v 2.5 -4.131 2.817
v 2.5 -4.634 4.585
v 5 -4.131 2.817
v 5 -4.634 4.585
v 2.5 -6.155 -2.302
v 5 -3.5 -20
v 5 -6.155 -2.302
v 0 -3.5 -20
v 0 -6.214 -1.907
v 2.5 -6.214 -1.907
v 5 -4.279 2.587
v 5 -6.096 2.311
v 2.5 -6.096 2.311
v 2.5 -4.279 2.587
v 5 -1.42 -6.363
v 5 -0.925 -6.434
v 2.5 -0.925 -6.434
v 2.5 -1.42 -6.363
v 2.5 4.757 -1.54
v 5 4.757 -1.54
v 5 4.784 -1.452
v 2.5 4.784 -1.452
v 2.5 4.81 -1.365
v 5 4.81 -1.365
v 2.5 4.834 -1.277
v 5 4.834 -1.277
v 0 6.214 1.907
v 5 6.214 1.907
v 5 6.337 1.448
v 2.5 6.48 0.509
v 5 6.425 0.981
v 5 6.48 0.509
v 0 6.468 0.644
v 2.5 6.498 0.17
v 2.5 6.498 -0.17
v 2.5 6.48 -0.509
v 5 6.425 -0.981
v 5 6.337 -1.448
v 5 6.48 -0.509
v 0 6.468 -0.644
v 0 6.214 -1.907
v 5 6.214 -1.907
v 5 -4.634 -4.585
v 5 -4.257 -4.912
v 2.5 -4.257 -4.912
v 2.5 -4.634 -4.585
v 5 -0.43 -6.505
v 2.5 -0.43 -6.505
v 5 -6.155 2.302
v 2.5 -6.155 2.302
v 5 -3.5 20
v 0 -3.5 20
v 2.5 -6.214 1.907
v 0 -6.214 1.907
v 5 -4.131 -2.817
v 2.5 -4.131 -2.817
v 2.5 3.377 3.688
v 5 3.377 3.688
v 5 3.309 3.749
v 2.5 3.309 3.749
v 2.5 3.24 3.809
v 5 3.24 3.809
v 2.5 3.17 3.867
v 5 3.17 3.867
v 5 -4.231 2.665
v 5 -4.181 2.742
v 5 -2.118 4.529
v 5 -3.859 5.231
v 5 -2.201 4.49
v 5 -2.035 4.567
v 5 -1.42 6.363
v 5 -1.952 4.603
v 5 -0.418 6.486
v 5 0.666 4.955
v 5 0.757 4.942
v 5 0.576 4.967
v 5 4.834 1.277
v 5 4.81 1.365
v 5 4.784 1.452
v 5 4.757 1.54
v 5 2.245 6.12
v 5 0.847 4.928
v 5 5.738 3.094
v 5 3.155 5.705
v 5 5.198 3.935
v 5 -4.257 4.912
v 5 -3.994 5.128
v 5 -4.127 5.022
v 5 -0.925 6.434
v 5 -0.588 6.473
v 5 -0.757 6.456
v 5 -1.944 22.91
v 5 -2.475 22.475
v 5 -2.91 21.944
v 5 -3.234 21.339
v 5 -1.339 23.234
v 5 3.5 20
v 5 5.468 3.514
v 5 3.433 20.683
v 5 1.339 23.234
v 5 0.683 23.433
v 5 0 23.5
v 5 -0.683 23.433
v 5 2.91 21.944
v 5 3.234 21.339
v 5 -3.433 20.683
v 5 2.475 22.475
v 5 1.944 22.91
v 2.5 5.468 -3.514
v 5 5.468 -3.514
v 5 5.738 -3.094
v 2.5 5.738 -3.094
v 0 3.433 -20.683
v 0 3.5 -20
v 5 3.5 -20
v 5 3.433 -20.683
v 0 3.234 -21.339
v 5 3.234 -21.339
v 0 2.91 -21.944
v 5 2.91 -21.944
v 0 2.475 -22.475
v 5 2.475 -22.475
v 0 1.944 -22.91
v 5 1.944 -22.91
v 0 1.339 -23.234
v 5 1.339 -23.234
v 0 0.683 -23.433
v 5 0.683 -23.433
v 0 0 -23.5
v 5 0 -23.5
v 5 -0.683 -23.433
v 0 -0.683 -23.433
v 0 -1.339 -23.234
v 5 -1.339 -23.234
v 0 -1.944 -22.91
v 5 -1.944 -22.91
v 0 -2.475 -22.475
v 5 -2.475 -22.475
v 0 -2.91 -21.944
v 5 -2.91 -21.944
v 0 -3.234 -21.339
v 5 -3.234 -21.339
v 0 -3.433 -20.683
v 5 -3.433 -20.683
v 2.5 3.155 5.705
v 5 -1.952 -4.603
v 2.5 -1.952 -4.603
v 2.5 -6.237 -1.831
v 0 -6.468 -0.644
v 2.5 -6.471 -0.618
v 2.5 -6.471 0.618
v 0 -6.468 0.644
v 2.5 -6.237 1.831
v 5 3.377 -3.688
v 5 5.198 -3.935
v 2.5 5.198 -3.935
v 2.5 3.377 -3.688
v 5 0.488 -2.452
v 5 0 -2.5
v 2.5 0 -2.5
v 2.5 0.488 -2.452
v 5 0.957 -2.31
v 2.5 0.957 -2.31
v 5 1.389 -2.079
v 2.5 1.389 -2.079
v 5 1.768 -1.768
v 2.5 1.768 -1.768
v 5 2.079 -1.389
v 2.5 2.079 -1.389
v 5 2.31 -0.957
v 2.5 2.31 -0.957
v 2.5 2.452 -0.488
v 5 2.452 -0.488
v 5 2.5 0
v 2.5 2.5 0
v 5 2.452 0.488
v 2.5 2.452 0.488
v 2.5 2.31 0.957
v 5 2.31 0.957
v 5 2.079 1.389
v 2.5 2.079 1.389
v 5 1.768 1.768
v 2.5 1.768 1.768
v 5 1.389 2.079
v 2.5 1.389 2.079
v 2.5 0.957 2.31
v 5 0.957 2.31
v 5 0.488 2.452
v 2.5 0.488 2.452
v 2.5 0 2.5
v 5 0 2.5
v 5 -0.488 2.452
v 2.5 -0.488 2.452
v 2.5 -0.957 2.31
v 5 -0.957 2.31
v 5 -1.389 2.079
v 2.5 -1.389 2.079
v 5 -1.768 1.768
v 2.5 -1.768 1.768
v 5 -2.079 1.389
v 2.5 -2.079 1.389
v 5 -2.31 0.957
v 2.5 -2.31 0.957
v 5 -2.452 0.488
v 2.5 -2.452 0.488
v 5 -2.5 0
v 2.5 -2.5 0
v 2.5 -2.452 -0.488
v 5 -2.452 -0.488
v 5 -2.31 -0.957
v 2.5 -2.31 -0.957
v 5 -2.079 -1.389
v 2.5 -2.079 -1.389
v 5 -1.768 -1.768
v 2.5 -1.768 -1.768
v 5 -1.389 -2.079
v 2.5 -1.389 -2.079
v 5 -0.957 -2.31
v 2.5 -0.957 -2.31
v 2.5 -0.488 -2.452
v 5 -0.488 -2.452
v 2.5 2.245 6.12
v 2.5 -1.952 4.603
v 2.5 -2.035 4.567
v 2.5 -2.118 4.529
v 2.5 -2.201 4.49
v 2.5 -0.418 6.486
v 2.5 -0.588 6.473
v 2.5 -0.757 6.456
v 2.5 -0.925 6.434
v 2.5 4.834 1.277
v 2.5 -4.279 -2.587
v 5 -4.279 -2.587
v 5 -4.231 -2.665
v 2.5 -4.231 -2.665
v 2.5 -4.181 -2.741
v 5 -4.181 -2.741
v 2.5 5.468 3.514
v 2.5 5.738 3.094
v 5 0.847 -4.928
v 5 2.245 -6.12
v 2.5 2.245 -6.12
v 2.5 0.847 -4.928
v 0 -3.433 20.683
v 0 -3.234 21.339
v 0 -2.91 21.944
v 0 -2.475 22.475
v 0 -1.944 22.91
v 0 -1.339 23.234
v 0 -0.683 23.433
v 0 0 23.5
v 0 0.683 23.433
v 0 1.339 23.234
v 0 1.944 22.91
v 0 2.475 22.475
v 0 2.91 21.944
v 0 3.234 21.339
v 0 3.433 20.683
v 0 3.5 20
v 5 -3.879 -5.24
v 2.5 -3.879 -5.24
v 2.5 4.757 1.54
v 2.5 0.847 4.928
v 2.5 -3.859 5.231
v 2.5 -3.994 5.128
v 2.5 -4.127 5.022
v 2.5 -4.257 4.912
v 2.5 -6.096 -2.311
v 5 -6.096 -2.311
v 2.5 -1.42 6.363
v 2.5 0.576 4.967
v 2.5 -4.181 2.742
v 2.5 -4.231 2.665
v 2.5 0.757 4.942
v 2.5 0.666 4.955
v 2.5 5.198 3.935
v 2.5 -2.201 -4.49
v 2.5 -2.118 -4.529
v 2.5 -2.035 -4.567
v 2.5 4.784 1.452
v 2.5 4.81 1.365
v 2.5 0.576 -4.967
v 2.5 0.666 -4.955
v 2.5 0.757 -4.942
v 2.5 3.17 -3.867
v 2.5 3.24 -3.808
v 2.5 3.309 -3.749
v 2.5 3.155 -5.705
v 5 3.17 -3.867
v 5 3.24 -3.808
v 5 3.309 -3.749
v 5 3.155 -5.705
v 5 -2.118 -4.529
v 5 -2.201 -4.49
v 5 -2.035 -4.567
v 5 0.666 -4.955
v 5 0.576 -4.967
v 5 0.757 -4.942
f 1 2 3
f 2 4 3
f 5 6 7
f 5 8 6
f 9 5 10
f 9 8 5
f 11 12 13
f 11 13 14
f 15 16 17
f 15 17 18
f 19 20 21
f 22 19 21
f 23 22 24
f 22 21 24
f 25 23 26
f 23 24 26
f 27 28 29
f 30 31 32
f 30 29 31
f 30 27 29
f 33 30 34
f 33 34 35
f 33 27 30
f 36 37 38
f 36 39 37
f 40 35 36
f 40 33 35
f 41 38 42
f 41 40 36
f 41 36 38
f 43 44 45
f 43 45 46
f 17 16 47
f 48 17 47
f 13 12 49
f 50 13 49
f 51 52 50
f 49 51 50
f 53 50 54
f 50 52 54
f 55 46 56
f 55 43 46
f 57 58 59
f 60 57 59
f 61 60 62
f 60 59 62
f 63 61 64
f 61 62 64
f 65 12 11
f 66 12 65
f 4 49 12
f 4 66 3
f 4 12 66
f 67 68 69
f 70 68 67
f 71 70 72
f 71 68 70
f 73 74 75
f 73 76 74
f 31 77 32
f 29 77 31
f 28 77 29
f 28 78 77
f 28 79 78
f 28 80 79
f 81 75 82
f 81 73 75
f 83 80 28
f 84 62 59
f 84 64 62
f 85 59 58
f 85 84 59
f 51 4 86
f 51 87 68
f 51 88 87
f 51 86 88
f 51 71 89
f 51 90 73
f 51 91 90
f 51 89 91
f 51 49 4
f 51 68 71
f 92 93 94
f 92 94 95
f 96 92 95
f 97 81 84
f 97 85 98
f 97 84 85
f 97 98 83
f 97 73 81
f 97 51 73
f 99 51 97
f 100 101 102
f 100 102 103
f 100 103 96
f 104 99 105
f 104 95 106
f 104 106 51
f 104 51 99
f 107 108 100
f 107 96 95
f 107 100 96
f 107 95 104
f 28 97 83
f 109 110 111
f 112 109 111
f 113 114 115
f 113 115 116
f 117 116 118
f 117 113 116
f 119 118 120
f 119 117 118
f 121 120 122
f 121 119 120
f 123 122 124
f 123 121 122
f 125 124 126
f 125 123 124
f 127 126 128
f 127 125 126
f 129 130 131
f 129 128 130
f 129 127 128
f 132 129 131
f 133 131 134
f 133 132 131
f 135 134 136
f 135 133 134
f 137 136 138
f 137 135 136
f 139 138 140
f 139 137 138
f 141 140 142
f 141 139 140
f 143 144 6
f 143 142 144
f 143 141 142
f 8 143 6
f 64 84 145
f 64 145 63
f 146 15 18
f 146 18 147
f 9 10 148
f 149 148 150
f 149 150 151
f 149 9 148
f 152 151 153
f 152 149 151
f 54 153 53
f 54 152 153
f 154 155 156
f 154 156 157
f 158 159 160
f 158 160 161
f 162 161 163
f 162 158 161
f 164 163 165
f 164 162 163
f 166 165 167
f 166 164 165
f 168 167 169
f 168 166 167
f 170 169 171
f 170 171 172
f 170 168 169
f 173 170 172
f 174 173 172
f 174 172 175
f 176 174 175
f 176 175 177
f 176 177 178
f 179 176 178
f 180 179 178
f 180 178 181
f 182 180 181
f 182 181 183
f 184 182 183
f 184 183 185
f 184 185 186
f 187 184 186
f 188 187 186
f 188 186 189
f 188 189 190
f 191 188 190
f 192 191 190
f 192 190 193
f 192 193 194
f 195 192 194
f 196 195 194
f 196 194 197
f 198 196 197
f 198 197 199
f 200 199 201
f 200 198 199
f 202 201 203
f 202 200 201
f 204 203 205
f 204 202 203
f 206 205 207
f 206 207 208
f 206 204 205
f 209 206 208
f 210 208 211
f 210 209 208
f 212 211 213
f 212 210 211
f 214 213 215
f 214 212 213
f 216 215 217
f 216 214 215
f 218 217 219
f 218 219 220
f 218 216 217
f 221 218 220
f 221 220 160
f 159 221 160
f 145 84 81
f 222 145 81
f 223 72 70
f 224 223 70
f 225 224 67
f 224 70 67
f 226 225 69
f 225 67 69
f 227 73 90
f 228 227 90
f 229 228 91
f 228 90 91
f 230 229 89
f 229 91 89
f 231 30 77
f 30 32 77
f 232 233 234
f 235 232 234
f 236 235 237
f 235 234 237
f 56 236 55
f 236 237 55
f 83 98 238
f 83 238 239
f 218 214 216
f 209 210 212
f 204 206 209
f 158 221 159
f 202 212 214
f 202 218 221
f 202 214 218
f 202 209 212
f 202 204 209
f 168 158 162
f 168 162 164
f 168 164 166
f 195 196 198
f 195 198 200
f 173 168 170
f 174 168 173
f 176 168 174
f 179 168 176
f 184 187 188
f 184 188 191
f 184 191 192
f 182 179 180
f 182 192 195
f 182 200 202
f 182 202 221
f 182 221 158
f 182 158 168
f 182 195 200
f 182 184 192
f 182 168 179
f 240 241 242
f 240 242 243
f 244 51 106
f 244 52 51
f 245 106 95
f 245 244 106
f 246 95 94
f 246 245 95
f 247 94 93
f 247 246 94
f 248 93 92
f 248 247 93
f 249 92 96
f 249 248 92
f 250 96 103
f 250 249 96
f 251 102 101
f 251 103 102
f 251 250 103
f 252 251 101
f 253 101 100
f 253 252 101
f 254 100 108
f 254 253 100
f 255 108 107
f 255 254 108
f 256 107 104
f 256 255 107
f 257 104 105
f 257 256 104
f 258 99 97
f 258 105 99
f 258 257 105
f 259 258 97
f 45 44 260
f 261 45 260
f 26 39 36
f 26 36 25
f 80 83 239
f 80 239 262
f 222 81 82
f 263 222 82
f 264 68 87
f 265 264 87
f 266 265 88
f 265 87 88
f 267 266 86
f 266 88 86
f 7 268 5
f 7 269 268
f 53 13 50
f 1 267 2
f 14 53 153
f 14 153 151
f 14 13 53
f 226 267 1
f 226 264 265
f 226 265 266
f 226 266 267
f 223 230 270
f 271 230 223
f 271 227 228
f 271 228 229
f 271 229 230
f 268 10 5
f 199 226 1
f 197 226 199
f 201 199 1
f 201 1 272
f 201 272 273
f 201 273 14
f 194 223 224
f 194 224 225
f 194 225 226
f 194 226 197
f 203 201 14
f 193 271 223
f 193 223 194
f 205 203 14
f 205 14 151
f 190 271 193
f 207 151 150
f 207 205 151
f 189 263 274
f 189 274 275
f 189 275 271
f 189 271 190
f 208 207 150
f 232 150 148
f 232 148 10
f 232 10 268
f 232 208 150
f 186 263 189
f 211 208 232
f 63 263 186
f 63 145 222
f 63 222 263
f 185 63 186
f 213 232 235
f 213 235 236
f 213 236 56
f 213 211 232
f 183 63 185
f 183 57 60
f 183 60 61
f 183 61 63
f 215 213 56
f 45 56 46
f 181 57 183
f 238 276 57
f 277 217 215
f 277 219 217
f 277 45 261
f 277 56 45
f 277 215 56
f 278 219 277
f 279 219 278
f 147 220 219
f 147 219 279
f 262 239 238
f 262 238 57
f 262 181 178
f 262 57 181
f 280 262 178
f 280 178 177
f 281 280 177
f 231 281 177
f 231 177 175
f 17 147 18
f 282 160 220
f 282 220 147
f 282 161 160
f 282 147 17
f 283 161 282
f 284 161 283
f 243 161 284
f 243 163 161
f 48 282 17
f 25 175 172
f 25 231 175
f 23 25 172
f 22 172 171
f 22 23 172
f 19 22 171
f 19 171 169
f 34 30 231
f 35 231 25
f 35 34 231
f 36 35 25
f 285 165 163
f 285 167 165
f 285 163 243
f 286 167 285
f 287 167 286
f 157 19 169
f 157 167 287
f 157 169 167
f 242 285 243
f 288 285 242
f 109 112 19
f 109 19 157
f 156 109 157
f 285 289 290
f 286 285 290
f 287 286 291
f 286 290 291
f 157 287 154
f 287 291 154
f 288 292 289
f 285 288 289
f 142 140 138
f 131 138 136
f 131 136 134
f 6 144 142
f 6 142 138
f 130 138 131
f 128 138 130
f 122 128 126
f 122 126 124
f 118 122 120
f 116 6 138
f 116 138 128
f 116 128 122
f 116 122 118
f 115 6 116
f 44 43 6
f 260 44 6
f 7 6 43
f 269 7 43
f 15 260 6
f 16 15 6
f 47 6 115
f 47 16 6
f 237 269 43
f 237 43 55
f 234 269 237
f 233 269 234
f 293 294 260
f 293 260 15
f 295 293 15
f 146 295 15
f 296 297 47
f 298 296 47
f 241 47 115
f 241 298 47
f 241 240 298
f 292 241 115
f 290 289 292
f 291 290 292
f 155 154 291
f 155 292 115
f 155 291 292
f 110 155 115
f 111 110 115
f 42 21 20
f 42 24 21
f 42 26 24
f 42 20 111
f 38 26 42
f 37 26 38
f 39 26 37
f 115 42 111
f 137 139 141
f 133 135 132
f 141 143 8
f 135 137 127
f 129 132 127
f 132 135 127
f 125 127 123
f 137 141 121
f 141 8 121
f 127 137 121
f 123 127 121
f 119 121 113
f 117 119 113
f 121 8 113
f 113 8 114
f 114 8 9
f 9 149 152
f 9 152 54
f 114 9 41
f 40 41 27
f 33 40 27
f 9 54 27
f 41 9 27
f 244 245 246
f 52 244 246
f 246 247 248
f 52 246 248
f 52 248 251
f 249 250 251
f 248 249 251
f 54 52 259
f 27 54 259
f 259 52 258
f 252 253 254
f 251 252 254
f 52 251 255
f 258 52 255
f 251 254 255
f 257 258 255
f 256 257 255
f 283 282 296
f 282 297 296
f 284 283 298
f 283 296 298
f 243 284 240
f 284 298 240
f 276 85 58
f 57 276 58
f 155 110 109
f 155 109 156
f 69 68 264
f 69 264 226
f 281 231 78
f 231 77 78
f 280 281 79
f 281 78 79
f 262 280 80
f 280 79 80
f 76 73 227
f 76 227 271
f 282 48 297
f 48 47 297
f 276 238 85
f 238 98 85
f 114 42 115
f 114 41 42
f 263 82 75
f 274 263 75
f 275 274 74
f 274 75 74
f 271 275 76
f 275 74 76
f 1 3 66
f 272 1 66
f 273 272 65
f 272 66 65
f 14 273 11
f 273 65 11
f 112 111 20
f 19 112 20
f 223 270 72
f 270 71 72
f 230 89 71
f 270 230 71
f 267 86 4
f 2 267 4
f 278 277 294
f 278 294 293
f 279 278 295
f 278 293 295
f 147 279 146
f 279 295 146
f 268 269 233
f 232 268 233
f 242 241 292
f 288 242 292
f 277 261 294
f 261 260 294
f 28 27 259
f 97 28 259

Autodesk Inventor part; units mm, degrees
ref_plane "YZ Plane" through (0, 0, 0) normal (1, 0, 0) x (0, 1, 0)
ref_plane "XZ Plane" through (0, 0, 0) normal (0, 1, 0) x (-1, 0, 0)
ref_plane "XY Plane" through (0, 0, 0) normal (0, 0, 1) x (1, 0, 0)
sketch "Sketch1" plane through (0, 0, 0) normal (1, 0, 0) x (0, 1, 0)
  arc A0 (3.5, 20) -> (-3.5, 20) centre (0, 20) ccw
  line L0 (6.2139, 1.9071) -> (3.5, 20)
  line L1 (-3.5, 20) -> (-6.2139, 1.9071)
  line L2 (0, 0) -> (2.6706, 0)
  arc A1 (-3.5, -20) -> (3.5, -20) centre (0, -20) ccw
  line L3 (-3.5, -20) -> (-6.2139, -1.9071)
  line L4 (6.2139, -1.9071) -> (3.5, -20)
  arc A2 (-6.2139, 1.9071) -> (-6.2139, -1.9071) centre (0, 0) ccw
  arc A3 (6.2139, -1.9071) -> (6.2139, 1.9071) centre (0, 0) ccw
  line L5 (0, 0) -> (2.6706, 0)
  point P0 (6.5, 0)
  point P1 (-6.5, 0)
  dimension "d0" = 7
  dimension "d1" = 20
extrude "Extrusion1" add sketch "Sketch1" along normal blind 5
sketch "Sketch2" plane through (5, 0, 0) normal (1, 0, 0) x (0, 0, -1)
  line L0 (0, 6.5) -> (0.5, 6.5)
  line L1 (0.5, 6.5) -> (1.2768, 4.8342)
  line L2 (-0.5, 6.5) -> (-1.2768, 4.8342)
  line L3 (0, 6.5) -> (-0.5, 6.5)
  line L4 (-3.5142, 5.4681) -> (-3.0935, 5.7385)
  line L5 (-3.0935, 5.7385) -> (-1.5395, 4.7571)
  line L6 (-3.9348, 5.1978) -> (-3.6877, 3.3766)
  line L7 (-3.5142, 5.4681) -> (-3.9348, 5.1978)
  line L8 (-5.9126, 2.7002) -> (-5.7049, 3.155)
  line L9 (-5.7049, 3.155) -> (-3.867, 3.1696)
  line L10 (-6.1203, 2.2454) -> (-4.9278, 0.8468)
  line L11 (-5.9126, 2.7002) -> (-6.1203, 2.2454)
  line L12 (-6.4338, -0.925) -> (-6.505, -0.4301)
  line L13 (-6.505, -0.4301) -> (-4.9667, 0.5758)
  line L14 (-6.3627, -1.42) -> (-4.6033, -1.9517)
  line L15 (-6.4338, -0.925) -> (-6.3627, -1.42)
  line L16 (-4.9124, -4.2566) -> (-5.2398, -3.8787)
  line L17 (-5.2398, -3.8787) -> (-4.4896, -2.2008)
  line L18 (-4.5849, -4.6345) -> (-2.8174, -4.1307)
  line L19 (-4.9124, -4.2566) -> (-4.5849, -4.6345)
  line L20 (-1.8313, -6.2367) -> (-2.311, -6.0958)
  line L21 (-2.311, -6.0958) -> (-2.587, -4.2787)
  line L22 (-1.3515, -6.3776) -> (-0.1369, -4.9981)
  line L23 (-1.8313, -6.2367) -> (-1.3515, -6.3776)
  line L24 (1.8313, -6.2367) -> (1.3515, -6.3776)
  line L25 (1.3515, -6.3776) -> (0.1369, -4.9981)
  line L26 (2.311, -6.0958) -> (2.587, -4.2787)
  line L27 (1.8313, -6.2367) -> (2.311, -6.0958)
  line L28 (4.9124, -4.2566) -> (4.5849, -4.6345)
  line L29 (4.5849, -4.6345) -> (2.8174, -4.1307)
  line L30 (5.2398, -3.8787) -> (4.4896, -2.2008)
  line L31 (4.9124, -4.2566) -> (5.2398, -3.8787)
  line L32 (6.4338, -0.925) -> (6.3627, -1.42)
  line L33 (6.3627, -1.42) -> (4.6033, -1.9517)
  line L34 (6.505, -0.4301) -> (4.9667, 0.5758)
  line L35 (6.4338, -0.925) -> (6.505, -0.4301)
  line L36 (5.9126, 2.7002) -> (6.1203, 2.2454)
  line L37 (6.1203, 2.2454) -> (4.9278, 0.8468)
  line L38 (5.7049, 3.155) -> (3.867, 3.1696)
  line L39 (5.9126, 2.7002) -> (5.7049, 3.155)
  line L40 (3.5142, 5.4681) -> (3.9348, 5.1978)
  line L41 (3.9348, 5.1978) -> (3.6877, 3.3766)
  line L42 (3.0935, 5.7385) -> (1.5395, 4.7571)
  line L43 (3.5142, 5.4681) -> (3.0935, 5.7385)
  arc A0 (-1.2768, 4.8342) -> (-1.5395, 4.7571) centre (0, 0) ccw
  arc A1 (1.5395, 4.7571) -> (1.2768, 4.8342) centre (0, 0) ccw
  arc A2 (3.867, 3.1696) -> (3.6877, 3.3766) centre (0, 0) ccw
  arc A3 (4.9667, 0.5758) -> (4.9278, 0.8468) centre (0, 0) ccw
  arc A4 (4.4896, -2.2008) -> (4.6033, -1.9517) centre (0, 0) ccw
  arc A5 (2.587, -4.2787) -> (2.8174, -4.1307) centre (0, 0) ccw
  arc A6 (-0.1369, -4.9981) -> (0.1369, -4.9981) centre (0, 0) ccw
  arc A7 (-2.8174, -4.1307) -> (-2.587, -4.2787) centre (0, 0) ccw
  arc A8 (-4.6033, -1.9517) -> (-4.4896, -2.2008) centre (0, 0) ccw
  arc A9 (-3.6877, 3.3766) -> (-3.867, 3.1696) centre (0, 0) ccw
  arc A10 (-4.9278, 0.8468) -> (-4.9667, 0.5758) centre (0, 0) ccw
  circle A11 centre (0, 0) radius 2.5
  arc A12 (-1.9071, -6.2139) -> (1.9071, -6.2139) centre (0, 0) ccw projected
  line L44 (-2.311, -6.0958) -> (-2.3021, -6.1547)
  line L45 (-20, -3.5) -> (-1.9071, -6.2139) projected
  line L46 (-2.3021, -6.1547) -> (-1.9071, -6.2139)
  line L47 (2.311, -6.0958) -> (2.3021, -6.1547)
  line L48 (1.9071, -6.2139) -> (20, -3.5) projected
  line L49 (2.3021, -6.1547) -> (1.9088, -6.2139)
  arc A13 (-6.4865, -0.4181) -> (-6.4338, -0.925) centre (0, 0) ccw
  arc A14 (-5.2308, -3.8586) -> (-4.9124, -4.2566) centre (0, 0) ccw
  arc A15 (-2.3143, -6.074) -> (-1.3369, -6.361) centre (0, 0) ccw
  arc A16 (0, -6.5) -> (2.3143, -6.074) centre (0, 0) ccw
  point P0 (0, 5)
  point P1 (-2.7032, 4.2063)
  point P2 (-4.5482, 2.0771)
  point P3 (-4.9491, -0.7116)
  point P4 (-3.7787, -3.2743)
  point P5 (-1.4087, -4.7975)
  point P6 (1.4087, -4.7975)
  point P7 (3.7787, -3.2743)
  point P8 (4.9491, -0.7116)
  point P9 (4.5482, 2.0771)
  point P10 (2.7032, 4.2063)
  dimension "d8" = 0.5
  dimension "d9" = 115
  dimension "d10" = 6.5
  dimension "d11" = 360
  dimension "d12" = 5
extrude "Extrusion2" cut sketch "Sketch2" against normal blind 2.5 contours L0 L1 A1 L42 L43 L40 L41 A2 L38 L39 L36 L37 A3 L34 L35 L32 L33 A4 L30 L31 L28 L29 A5 L26 A16 L27 A12 L25 A6 L22 L20 A15 L21 A7 L18 L19 A14 L17 A8 L14 L15 A13 L13 A10 L10 L11 L8 L9 A9 L6 L7 L4 L5 A0 L2 L3 | L26 L27 A16 | A15 L20 L21 | L47 L48 L27 | L20 L45 L44 | A12 L22 A6 L25
properties part number "servo horn"
